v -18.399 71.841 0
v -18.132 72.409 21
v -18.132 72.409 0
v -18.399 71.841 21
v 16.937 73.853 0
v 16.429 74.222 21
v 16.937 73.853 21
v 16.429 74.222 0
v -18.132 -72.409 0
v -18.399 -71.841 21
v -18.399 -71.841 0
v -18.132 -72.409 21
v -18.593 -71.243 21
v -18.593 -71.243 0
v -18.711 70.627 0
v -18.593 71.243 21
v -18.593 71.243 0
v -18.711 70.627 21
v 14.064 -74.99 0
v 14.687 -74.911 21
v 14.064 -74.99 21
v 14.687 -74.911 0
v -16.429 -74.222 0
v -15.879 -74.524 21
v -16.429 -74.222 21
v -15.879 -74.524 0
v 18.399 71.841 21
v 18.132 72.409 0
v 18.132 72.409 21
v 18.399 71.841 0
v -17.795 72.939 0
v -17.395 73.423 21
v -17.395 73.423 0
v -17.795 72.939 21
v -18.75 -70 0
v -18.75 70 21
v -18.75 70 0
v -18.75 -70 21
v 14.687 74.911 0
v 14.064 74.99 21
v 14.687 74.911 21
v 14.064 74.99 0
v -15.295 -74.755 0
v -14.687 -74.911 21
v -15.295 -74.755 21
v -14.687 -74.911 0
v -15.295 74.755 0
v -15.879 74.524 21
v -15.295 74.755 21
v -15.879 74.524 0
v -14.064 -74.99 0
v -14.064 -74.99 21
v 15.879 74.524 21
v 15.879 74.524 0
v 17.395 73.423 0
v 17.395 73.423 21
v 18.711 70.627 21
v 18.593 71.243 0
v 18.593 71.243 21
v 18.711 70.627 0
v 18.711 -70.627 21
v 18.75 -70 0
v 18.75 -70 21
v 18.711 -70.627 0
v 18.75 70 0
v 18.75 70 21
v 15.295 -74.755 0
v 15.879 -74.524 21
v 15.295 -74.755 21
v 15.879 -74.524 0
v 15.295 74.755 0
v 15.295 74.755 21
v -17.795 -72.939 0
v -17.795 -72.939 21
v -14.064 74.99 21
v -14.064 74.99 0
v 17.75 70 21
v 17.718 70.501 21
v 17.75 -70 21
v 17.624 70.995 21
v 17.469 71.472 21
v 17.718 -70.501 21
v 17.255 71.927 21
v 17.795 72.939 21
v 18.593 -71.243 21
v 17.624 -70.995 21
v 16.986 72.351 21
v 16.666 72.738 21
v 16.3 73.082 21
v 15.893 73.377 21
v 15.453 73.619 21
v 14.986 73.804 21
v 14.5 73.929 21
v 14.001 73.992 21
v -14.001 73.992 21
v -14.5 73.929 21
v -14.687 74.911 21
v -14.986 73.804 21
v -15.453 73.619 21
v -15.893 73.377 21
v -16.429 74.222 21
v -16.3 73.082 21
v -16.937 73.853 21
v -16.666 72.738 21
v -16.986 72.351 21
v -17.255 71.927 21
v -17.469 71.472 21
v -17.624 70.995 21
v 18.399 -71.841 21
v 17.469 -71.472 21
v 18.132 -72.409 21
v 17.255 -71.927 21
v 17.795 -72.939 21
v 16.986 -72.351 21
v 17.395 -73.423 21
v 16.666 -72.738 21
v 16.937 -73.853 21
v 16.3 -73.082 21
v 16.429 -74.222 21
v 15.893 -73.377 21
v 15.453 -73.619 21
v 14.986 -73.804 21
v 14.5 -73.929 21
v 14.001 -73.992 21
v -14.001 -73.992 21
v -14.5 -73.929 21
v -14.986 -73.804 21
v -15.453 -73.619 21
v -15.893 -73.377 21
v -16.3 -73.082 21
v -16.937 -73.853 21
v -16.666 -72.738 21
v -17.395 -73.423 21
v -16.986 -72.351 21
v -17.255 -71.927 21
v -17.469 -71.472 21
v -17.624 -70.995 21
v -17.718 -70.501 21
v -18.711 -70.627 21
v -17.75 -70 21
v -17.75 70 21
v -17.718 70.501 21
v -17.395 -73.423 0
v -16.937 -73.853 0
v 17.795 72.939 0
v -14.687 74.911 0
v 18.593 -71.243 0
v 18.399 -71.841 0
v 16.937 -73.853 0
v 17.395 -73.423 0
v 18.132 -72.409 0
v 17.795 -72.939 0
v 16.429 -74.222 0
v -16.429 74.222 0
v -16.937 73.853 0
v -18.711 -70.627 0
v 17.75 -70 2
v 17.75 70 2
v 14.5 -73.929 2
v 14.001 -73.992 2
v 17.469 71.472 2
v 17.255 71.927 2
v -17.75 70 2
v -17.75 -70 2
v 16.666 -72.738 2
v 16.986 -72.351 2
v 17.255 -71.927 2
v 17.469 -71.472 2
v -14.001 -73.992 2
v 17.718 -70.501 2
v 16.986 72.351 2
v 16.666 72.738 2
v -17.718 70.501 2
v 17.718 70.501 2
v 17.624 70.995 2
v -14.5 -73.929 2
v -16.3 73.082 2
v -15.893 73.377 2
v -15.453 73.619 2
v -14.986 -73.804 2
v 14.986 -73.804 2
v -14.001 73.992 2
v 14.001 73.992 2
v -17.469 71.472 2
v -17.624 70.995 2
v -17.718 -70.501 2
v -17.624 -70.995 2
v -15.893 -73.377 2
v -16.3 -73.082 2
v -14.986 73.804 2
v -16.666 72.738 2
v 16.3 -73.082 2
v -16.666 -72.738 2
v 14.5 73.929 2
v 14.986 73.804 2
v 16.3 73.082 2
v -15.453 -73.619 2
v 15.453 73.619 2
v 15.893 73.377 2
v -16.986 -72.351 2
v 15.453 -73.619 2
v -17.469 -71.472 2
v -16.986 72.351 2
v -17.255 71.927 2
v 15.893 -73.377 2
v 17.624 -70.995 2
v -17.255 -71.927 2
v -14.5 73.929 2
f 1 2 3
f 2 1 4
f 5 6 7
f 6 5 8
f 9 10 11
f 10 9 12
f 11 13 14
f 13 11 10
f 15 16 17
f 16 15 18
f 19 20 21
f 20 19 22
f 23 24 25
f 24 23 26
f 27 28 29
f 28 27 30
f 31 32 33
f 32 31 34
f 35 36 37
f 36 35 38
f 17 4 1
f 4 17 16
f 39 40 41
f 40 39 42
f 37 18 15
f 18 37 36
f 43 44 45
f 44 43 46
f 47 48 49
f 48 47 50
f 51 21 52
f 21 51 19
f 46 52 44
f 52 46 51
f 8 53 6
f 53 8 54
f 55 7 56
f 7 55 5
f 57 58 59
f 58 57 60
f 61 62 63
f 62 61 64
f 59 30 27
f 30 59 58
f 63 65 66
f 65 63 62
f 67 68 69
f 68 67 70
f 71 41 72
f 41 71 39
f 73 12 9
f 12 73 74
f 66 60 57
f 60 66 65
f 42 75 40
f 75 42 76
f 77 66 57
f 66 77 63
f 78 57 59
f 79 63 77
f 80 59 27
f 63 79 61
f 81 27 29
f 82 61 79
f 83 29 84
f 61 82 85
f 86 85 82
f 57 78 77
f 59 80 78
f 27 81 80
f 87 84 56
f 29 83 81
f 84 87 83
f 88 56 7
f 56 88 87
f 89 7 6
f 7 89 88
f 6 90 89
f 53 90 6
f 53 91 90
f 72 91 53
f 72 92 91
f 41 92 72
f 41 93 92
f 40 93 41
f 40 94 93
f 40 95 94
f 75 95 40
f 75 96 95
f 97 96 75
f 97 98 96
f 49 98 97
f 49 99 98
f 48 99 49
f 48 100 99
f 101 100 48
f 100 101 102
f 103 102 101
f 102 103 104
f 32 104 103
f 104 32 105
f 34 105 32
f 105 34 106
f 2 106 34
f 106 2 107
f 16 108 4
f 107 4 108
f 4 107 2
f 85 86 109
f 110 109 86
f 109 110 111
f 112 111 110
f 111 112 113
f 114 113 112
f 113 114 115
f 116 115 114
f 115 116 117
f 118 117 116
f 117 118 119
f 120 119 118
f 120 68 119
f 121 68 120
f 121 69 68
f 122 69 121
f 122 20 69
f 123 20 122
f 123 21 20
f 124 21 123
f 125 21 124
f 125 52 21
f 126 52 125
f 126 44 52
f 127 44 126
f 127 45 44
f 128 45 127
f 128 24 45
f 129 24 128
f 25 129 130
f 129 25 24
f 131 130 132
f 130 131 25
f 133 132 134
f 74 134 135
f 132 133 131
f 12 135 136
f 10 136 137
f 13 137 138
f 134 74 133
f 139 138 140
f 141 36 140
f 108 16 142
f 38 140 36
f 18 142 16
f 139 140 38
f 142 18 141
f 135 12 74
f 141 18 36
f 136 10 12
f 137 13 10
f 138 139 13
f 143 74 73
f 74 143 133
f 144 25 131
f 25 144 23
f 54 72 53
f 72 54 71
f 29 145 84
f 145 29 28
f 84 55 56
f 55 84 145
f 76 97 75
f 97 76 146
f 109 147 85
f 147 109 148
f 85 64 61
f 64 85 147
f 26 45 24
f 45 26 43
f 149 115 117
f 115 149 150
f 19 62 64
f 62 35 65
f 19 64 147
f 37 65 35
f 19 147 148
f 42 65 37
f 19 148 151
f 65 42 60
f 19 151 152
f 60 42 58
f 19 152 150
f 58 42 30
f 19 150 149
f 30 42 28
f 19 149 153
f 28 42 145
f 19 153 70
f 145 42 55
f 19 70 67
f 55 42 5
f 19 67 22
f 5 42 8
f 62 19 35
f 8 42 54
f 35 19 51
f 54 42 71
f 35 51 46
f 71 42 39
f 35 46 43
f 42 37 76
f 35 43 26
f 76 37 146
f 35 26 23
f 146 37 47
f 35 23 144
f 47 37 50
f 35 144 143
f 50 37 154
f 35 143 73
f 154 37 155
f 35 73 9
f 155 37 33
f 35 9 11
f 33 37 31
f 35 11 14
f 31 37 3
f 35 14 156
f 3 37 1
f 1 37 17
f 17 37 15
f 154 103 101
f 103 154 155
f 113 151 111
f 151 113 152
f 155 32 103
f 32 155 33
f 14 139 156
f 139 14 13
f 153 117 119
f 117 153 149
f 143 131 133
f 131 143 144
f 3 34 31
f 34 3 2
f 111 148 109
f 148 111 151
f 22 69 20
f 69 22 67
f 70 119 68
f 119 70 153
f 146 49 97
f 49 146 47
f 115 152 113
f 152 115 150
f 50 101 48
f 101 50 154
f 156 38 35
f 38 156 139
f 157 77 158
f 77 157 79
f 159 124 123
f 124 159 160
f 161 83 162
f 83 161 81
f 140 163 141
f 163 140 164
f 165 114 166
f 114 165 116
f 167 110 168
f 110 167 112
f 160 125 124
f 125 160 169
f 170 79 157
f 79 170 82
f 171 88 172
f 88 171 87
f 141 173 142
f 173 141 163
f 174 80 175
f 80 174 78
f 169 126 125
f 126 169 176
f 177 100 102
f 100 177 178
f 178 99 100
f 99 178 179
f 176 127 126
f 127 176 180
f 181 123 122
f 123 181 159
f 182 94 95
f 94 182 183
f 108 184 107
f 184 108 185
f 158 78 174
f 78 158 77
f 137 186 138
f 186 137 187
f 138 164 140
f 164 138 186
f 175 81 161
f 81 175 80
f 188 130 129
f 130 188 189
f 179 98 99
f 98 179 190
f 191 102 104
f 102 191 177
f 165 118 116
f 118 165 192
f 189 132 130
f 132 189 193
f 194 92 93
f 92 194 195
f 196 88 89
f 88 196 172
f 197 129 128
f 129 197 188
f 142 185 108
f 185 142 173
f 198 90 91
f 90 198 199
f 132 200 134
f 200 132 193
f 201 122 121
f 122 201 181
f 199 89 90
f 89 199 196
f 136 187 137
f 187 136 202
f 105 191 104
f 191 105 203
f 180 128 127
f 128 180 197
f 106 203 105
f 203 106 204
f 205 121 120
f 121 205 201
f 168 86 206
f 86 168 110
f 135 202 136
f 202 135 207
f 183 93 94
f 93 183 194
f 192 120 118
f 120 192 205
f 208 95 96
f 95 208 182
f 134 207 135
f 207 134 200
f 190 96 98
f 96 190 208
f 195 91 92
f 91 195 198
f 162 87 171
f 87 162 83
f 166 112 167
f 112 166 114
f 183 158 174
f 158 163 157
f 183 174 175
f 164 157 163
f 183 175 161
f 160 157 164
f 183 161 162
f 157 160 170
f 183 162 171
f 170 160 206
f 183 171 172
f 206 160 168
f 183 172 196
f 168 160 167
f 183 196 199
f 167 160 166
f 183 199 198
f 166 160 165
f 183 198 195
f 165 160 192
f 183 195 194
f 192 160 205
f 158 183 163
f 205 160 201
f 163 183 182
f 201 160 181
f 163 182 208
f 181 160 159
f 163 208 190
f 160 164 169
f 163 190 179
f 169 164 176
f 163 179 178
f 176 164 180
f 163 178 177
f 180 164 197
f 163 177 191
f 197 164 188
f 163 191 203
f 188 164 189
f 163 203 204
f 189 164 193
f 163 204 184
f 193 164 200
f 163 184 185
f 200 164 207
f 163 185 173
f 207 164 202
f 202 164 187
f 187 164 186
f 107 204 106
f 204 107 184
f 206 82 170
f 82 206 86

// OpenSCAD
$fn = 50;


difference() {
	union() {
		hull() {
			translate(v = [-13.7500000000, 70.0000000000, 0]) {
				cylinder(h = 21, r = 5);
			}
			translate(v = [13.7500000000, 70.0000000000, 0]) {
				cylinder(h = 21, r = 5);
			}
			translate(v = [-13.7500000000, -70.0000000000, 0]) {
				cylinder(h = 21, r = 5);
			}
			translate(v = [13.7500000000, -70.0000000000, 0]) {
				cylinder(h = 21, r = 5);
			}
		}
	}
	union() {
		translate(v = [0, 0, 2]) {
			hull() {
				translate(v = [-13.7500000000, 70.0000000000, 0]) {
					cylinder(h = 19, r = 4);
				}
				translate(v = [13.7500000000, 70.0000000000, 0]) {
					cylinder(h = 19, r = 4);
				}
				translate(v = [-13.7500000000, -70.0000000000, 0]) {
					cylinder(h = 19, r = 4);
				}
				translate(v = [13.7500000000, -70.0000000000, 0]) {
					cylinder(h = 19, r = 4);
				}
			}
		}
	}
}
